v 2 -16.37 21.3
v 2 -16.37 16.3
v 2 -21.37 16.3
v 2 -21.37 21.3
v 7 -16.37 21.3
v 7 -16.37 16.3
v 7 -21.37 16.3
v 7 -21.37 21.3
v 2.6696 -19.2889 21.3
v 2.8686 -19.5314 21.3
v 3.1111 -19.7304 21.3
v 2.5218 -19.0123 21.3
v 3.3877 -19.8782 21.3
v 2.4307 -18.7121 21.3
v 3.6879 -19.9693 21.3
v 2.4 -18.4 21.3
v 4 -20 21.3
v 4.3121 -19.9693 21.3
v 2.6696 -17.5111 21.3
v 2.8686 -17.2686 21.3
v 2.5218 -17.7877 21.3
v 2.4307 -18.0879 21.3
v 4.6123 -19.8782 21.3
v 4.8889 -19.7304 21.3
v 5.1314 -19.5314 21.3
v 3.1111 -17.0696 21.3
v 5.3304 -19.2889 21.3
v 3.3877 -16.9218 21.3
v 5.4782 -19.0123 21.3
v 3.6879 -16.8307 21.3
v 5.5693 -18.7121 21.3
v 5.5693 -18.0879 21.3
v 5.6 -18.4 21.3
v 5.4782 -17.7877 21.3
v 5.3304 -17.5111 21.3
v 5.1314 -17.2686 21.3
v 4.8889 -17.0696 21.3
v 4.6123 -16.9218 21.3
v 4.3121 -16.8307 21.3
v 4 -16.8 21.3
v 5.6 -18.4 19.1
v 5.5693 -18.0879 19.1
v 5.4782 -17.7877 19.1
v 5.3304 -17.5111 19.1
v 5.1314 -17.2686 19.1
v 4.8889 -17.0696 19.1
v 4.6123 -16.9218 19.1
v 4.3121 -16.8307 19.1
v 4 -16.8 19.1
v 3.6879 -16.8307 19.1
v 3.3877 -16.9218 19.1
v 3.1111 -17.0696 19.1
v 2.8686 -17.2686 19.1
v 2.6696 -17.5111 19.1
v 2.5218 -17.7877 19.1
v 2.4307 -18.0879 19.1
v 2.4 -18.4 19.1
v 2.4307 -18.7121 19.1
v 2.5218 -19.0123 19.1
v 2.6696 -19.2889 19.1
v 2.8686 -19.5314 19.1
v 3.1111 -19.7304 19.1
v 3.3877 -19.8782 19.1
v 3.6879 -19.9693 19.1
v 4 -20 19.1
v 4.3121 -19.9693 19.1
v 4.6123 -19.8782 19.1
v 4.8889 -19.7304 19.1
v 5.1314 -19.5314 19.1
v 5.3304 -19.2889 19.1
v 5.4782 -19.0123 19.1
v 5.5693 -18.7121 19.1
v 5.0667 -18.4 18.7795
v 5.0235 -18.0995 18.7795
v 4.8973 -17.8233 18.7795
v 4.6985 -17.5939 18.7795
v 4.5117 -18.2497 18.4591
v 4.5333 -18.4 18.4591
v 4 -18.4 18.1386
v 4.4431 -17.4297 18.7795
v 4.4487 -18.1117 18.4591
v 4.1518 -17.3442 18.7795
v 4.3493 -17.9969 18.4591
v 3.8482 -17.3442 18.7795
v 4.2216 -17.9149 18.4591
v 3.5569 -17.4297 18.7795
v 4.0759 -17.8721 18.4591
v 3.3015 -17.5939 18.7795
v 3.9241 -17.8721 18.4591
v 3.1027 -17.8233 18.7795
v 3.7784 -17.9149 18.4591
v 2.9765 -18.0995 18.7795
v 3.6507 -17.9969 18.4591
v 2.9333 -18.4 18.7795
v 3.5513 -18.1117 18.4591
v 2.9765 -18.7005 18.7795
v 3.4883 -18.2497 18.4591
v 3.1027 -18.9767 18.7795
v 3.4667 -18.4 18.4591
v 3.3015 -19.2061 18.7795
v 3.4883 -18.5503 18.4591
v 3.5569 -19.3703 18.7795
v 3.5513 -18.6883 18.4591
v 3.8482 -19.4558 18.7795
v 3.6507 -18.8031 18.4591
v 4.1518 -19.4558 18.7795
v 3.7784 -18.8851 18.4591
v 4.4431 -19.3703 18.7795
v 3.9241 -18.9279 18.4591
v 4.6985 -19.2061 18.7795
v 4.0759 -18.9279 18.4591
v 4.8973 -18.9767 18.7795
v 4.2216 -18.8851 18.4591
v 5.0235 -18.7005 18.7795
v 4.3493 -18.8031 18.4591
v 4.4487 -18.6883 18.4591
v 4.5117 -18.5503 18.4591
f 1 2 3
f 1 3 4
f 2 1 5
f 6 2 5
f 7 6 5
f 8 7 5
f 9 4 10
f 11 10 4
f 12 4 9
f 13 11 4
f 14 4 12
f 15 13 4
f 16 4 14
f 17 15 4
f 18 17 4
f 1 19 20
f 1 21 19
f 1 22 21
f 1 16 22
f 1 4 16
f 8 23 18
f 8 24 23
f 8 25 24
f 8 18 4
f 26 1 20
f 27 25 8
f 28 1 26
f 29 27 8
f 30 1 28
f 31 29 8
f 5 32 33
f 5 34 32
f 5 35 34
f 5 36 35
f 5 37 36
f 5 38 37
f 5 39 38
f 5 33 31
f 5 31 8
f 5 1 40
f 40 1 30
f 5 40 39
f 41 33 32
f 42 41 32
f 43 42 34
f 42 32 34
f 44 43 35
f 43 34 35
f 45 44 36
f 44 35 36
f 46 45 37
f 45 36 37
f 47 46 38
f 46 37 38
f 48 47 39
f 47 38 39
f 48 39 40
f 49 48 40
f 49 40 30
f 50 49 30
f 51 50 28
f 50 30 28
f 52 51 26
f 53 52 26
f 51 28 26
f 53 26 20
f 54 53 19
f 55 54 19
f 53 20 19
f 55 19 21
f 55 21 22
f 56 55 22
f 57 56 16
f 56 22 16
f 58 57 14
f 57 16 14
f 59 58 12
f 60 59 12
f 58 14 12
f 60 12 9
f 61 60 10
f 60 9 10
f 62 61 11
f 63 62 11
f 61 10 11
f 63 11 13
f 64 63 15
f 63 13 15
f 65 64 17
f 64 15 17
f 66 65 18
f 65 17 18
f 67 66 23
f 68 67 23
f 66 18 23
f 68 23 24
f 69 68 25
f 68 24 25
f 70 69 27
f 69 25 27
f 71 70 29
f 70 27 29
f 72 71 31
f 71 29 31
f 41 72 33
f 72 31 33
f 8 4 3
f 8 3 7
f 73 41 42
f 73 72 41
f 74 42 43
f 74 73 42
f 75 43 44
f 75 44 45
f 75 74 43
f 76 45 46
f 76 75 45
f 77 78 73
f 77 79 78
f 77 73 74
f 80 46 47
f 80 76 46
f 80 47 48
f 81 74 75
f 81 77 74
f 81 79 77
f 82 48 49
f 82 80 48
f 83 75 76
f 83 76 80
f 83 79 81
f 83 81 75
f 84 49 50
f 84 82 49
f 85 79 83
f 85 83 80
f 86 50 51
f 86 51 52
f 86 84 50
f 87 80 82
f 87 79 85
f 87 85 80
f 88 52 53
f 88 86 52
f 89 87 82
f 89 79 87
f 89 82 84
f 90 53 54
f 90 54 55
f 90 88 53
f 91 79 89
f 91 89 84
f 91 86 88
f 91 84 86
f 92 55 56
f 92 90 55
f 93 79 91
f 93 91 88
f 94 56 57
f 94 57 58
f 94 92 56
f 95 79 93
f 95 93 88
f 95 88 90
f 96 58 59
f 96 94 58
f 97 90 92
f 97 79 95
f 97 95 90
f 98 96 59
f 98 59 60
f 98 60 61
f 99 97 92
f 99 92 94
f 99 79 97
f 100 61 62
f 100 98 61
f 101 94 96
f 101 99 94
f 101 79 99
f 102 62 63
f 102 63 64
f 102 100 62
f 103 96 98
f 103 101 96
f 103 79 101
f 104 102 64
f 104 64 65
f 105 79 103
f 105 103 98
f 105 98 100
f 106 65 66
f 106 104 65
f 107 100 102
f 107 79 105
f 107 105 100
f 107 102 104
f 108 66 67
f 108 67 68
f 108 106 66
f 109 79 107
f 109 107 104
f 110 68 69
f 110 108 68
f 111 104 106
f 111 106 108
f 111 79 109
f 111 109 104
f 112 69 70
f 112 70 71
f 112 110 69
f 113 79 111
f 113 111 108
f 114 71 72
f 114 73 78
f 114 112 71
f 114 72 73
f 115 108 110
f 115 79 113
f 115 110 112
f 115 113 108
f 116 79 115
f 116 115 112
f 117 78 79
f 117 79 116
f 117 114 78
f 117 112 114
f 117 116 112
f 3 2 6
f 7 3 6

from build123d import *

# Parameters (mm, degrees)
SKETCH099_W      = 5
SKETCH099_H      = 5
EXTRUDE035_DEPTH = 5
SKETCH100_R      = 1.6
HOLE021_DEPTH    = 2.2
HOLE021_TIPS_R   = 1.6


with BuildPart() as part:
    # Sketch099 (on Face9 of Pocket017) → Extrude035 (new body)
    with BuildSketch(Plane.XZ.offset(16.37)):
        with Locations((4.5, 18.8)):
            Rectangle(SKETCH099_W, SKETCH099_H)
    extrude(amount=EXTRUDE035_DEPTH)

    # Sketch100 (on Face1 of Extrude035) → Hole021 (cut)
    with BuildSketch(Plane.XY.offset(21.3)):
        with Locations((4, -18.4)):
            Circle(SKETCH100_R)
    extrude(amount=-HOLE021_DEPTH, mode=Mode.SUBTRACT)

    # Hole021 tips → Hole021 tip 1 section 0
    with BuildSketch(Plane.XY.offset(19.1), mode=Mode.PRIVATE) as hole021_tip_1_s0:
        with Locations((4, -18.4)):
            Circle(HOLE021_TIPS_R)
    loft([hole021_tip_1_s0.sketch, Vertex(4, -18.4, 18.138623)], mode=Mode.SUBTRACT)


solid = part.part
